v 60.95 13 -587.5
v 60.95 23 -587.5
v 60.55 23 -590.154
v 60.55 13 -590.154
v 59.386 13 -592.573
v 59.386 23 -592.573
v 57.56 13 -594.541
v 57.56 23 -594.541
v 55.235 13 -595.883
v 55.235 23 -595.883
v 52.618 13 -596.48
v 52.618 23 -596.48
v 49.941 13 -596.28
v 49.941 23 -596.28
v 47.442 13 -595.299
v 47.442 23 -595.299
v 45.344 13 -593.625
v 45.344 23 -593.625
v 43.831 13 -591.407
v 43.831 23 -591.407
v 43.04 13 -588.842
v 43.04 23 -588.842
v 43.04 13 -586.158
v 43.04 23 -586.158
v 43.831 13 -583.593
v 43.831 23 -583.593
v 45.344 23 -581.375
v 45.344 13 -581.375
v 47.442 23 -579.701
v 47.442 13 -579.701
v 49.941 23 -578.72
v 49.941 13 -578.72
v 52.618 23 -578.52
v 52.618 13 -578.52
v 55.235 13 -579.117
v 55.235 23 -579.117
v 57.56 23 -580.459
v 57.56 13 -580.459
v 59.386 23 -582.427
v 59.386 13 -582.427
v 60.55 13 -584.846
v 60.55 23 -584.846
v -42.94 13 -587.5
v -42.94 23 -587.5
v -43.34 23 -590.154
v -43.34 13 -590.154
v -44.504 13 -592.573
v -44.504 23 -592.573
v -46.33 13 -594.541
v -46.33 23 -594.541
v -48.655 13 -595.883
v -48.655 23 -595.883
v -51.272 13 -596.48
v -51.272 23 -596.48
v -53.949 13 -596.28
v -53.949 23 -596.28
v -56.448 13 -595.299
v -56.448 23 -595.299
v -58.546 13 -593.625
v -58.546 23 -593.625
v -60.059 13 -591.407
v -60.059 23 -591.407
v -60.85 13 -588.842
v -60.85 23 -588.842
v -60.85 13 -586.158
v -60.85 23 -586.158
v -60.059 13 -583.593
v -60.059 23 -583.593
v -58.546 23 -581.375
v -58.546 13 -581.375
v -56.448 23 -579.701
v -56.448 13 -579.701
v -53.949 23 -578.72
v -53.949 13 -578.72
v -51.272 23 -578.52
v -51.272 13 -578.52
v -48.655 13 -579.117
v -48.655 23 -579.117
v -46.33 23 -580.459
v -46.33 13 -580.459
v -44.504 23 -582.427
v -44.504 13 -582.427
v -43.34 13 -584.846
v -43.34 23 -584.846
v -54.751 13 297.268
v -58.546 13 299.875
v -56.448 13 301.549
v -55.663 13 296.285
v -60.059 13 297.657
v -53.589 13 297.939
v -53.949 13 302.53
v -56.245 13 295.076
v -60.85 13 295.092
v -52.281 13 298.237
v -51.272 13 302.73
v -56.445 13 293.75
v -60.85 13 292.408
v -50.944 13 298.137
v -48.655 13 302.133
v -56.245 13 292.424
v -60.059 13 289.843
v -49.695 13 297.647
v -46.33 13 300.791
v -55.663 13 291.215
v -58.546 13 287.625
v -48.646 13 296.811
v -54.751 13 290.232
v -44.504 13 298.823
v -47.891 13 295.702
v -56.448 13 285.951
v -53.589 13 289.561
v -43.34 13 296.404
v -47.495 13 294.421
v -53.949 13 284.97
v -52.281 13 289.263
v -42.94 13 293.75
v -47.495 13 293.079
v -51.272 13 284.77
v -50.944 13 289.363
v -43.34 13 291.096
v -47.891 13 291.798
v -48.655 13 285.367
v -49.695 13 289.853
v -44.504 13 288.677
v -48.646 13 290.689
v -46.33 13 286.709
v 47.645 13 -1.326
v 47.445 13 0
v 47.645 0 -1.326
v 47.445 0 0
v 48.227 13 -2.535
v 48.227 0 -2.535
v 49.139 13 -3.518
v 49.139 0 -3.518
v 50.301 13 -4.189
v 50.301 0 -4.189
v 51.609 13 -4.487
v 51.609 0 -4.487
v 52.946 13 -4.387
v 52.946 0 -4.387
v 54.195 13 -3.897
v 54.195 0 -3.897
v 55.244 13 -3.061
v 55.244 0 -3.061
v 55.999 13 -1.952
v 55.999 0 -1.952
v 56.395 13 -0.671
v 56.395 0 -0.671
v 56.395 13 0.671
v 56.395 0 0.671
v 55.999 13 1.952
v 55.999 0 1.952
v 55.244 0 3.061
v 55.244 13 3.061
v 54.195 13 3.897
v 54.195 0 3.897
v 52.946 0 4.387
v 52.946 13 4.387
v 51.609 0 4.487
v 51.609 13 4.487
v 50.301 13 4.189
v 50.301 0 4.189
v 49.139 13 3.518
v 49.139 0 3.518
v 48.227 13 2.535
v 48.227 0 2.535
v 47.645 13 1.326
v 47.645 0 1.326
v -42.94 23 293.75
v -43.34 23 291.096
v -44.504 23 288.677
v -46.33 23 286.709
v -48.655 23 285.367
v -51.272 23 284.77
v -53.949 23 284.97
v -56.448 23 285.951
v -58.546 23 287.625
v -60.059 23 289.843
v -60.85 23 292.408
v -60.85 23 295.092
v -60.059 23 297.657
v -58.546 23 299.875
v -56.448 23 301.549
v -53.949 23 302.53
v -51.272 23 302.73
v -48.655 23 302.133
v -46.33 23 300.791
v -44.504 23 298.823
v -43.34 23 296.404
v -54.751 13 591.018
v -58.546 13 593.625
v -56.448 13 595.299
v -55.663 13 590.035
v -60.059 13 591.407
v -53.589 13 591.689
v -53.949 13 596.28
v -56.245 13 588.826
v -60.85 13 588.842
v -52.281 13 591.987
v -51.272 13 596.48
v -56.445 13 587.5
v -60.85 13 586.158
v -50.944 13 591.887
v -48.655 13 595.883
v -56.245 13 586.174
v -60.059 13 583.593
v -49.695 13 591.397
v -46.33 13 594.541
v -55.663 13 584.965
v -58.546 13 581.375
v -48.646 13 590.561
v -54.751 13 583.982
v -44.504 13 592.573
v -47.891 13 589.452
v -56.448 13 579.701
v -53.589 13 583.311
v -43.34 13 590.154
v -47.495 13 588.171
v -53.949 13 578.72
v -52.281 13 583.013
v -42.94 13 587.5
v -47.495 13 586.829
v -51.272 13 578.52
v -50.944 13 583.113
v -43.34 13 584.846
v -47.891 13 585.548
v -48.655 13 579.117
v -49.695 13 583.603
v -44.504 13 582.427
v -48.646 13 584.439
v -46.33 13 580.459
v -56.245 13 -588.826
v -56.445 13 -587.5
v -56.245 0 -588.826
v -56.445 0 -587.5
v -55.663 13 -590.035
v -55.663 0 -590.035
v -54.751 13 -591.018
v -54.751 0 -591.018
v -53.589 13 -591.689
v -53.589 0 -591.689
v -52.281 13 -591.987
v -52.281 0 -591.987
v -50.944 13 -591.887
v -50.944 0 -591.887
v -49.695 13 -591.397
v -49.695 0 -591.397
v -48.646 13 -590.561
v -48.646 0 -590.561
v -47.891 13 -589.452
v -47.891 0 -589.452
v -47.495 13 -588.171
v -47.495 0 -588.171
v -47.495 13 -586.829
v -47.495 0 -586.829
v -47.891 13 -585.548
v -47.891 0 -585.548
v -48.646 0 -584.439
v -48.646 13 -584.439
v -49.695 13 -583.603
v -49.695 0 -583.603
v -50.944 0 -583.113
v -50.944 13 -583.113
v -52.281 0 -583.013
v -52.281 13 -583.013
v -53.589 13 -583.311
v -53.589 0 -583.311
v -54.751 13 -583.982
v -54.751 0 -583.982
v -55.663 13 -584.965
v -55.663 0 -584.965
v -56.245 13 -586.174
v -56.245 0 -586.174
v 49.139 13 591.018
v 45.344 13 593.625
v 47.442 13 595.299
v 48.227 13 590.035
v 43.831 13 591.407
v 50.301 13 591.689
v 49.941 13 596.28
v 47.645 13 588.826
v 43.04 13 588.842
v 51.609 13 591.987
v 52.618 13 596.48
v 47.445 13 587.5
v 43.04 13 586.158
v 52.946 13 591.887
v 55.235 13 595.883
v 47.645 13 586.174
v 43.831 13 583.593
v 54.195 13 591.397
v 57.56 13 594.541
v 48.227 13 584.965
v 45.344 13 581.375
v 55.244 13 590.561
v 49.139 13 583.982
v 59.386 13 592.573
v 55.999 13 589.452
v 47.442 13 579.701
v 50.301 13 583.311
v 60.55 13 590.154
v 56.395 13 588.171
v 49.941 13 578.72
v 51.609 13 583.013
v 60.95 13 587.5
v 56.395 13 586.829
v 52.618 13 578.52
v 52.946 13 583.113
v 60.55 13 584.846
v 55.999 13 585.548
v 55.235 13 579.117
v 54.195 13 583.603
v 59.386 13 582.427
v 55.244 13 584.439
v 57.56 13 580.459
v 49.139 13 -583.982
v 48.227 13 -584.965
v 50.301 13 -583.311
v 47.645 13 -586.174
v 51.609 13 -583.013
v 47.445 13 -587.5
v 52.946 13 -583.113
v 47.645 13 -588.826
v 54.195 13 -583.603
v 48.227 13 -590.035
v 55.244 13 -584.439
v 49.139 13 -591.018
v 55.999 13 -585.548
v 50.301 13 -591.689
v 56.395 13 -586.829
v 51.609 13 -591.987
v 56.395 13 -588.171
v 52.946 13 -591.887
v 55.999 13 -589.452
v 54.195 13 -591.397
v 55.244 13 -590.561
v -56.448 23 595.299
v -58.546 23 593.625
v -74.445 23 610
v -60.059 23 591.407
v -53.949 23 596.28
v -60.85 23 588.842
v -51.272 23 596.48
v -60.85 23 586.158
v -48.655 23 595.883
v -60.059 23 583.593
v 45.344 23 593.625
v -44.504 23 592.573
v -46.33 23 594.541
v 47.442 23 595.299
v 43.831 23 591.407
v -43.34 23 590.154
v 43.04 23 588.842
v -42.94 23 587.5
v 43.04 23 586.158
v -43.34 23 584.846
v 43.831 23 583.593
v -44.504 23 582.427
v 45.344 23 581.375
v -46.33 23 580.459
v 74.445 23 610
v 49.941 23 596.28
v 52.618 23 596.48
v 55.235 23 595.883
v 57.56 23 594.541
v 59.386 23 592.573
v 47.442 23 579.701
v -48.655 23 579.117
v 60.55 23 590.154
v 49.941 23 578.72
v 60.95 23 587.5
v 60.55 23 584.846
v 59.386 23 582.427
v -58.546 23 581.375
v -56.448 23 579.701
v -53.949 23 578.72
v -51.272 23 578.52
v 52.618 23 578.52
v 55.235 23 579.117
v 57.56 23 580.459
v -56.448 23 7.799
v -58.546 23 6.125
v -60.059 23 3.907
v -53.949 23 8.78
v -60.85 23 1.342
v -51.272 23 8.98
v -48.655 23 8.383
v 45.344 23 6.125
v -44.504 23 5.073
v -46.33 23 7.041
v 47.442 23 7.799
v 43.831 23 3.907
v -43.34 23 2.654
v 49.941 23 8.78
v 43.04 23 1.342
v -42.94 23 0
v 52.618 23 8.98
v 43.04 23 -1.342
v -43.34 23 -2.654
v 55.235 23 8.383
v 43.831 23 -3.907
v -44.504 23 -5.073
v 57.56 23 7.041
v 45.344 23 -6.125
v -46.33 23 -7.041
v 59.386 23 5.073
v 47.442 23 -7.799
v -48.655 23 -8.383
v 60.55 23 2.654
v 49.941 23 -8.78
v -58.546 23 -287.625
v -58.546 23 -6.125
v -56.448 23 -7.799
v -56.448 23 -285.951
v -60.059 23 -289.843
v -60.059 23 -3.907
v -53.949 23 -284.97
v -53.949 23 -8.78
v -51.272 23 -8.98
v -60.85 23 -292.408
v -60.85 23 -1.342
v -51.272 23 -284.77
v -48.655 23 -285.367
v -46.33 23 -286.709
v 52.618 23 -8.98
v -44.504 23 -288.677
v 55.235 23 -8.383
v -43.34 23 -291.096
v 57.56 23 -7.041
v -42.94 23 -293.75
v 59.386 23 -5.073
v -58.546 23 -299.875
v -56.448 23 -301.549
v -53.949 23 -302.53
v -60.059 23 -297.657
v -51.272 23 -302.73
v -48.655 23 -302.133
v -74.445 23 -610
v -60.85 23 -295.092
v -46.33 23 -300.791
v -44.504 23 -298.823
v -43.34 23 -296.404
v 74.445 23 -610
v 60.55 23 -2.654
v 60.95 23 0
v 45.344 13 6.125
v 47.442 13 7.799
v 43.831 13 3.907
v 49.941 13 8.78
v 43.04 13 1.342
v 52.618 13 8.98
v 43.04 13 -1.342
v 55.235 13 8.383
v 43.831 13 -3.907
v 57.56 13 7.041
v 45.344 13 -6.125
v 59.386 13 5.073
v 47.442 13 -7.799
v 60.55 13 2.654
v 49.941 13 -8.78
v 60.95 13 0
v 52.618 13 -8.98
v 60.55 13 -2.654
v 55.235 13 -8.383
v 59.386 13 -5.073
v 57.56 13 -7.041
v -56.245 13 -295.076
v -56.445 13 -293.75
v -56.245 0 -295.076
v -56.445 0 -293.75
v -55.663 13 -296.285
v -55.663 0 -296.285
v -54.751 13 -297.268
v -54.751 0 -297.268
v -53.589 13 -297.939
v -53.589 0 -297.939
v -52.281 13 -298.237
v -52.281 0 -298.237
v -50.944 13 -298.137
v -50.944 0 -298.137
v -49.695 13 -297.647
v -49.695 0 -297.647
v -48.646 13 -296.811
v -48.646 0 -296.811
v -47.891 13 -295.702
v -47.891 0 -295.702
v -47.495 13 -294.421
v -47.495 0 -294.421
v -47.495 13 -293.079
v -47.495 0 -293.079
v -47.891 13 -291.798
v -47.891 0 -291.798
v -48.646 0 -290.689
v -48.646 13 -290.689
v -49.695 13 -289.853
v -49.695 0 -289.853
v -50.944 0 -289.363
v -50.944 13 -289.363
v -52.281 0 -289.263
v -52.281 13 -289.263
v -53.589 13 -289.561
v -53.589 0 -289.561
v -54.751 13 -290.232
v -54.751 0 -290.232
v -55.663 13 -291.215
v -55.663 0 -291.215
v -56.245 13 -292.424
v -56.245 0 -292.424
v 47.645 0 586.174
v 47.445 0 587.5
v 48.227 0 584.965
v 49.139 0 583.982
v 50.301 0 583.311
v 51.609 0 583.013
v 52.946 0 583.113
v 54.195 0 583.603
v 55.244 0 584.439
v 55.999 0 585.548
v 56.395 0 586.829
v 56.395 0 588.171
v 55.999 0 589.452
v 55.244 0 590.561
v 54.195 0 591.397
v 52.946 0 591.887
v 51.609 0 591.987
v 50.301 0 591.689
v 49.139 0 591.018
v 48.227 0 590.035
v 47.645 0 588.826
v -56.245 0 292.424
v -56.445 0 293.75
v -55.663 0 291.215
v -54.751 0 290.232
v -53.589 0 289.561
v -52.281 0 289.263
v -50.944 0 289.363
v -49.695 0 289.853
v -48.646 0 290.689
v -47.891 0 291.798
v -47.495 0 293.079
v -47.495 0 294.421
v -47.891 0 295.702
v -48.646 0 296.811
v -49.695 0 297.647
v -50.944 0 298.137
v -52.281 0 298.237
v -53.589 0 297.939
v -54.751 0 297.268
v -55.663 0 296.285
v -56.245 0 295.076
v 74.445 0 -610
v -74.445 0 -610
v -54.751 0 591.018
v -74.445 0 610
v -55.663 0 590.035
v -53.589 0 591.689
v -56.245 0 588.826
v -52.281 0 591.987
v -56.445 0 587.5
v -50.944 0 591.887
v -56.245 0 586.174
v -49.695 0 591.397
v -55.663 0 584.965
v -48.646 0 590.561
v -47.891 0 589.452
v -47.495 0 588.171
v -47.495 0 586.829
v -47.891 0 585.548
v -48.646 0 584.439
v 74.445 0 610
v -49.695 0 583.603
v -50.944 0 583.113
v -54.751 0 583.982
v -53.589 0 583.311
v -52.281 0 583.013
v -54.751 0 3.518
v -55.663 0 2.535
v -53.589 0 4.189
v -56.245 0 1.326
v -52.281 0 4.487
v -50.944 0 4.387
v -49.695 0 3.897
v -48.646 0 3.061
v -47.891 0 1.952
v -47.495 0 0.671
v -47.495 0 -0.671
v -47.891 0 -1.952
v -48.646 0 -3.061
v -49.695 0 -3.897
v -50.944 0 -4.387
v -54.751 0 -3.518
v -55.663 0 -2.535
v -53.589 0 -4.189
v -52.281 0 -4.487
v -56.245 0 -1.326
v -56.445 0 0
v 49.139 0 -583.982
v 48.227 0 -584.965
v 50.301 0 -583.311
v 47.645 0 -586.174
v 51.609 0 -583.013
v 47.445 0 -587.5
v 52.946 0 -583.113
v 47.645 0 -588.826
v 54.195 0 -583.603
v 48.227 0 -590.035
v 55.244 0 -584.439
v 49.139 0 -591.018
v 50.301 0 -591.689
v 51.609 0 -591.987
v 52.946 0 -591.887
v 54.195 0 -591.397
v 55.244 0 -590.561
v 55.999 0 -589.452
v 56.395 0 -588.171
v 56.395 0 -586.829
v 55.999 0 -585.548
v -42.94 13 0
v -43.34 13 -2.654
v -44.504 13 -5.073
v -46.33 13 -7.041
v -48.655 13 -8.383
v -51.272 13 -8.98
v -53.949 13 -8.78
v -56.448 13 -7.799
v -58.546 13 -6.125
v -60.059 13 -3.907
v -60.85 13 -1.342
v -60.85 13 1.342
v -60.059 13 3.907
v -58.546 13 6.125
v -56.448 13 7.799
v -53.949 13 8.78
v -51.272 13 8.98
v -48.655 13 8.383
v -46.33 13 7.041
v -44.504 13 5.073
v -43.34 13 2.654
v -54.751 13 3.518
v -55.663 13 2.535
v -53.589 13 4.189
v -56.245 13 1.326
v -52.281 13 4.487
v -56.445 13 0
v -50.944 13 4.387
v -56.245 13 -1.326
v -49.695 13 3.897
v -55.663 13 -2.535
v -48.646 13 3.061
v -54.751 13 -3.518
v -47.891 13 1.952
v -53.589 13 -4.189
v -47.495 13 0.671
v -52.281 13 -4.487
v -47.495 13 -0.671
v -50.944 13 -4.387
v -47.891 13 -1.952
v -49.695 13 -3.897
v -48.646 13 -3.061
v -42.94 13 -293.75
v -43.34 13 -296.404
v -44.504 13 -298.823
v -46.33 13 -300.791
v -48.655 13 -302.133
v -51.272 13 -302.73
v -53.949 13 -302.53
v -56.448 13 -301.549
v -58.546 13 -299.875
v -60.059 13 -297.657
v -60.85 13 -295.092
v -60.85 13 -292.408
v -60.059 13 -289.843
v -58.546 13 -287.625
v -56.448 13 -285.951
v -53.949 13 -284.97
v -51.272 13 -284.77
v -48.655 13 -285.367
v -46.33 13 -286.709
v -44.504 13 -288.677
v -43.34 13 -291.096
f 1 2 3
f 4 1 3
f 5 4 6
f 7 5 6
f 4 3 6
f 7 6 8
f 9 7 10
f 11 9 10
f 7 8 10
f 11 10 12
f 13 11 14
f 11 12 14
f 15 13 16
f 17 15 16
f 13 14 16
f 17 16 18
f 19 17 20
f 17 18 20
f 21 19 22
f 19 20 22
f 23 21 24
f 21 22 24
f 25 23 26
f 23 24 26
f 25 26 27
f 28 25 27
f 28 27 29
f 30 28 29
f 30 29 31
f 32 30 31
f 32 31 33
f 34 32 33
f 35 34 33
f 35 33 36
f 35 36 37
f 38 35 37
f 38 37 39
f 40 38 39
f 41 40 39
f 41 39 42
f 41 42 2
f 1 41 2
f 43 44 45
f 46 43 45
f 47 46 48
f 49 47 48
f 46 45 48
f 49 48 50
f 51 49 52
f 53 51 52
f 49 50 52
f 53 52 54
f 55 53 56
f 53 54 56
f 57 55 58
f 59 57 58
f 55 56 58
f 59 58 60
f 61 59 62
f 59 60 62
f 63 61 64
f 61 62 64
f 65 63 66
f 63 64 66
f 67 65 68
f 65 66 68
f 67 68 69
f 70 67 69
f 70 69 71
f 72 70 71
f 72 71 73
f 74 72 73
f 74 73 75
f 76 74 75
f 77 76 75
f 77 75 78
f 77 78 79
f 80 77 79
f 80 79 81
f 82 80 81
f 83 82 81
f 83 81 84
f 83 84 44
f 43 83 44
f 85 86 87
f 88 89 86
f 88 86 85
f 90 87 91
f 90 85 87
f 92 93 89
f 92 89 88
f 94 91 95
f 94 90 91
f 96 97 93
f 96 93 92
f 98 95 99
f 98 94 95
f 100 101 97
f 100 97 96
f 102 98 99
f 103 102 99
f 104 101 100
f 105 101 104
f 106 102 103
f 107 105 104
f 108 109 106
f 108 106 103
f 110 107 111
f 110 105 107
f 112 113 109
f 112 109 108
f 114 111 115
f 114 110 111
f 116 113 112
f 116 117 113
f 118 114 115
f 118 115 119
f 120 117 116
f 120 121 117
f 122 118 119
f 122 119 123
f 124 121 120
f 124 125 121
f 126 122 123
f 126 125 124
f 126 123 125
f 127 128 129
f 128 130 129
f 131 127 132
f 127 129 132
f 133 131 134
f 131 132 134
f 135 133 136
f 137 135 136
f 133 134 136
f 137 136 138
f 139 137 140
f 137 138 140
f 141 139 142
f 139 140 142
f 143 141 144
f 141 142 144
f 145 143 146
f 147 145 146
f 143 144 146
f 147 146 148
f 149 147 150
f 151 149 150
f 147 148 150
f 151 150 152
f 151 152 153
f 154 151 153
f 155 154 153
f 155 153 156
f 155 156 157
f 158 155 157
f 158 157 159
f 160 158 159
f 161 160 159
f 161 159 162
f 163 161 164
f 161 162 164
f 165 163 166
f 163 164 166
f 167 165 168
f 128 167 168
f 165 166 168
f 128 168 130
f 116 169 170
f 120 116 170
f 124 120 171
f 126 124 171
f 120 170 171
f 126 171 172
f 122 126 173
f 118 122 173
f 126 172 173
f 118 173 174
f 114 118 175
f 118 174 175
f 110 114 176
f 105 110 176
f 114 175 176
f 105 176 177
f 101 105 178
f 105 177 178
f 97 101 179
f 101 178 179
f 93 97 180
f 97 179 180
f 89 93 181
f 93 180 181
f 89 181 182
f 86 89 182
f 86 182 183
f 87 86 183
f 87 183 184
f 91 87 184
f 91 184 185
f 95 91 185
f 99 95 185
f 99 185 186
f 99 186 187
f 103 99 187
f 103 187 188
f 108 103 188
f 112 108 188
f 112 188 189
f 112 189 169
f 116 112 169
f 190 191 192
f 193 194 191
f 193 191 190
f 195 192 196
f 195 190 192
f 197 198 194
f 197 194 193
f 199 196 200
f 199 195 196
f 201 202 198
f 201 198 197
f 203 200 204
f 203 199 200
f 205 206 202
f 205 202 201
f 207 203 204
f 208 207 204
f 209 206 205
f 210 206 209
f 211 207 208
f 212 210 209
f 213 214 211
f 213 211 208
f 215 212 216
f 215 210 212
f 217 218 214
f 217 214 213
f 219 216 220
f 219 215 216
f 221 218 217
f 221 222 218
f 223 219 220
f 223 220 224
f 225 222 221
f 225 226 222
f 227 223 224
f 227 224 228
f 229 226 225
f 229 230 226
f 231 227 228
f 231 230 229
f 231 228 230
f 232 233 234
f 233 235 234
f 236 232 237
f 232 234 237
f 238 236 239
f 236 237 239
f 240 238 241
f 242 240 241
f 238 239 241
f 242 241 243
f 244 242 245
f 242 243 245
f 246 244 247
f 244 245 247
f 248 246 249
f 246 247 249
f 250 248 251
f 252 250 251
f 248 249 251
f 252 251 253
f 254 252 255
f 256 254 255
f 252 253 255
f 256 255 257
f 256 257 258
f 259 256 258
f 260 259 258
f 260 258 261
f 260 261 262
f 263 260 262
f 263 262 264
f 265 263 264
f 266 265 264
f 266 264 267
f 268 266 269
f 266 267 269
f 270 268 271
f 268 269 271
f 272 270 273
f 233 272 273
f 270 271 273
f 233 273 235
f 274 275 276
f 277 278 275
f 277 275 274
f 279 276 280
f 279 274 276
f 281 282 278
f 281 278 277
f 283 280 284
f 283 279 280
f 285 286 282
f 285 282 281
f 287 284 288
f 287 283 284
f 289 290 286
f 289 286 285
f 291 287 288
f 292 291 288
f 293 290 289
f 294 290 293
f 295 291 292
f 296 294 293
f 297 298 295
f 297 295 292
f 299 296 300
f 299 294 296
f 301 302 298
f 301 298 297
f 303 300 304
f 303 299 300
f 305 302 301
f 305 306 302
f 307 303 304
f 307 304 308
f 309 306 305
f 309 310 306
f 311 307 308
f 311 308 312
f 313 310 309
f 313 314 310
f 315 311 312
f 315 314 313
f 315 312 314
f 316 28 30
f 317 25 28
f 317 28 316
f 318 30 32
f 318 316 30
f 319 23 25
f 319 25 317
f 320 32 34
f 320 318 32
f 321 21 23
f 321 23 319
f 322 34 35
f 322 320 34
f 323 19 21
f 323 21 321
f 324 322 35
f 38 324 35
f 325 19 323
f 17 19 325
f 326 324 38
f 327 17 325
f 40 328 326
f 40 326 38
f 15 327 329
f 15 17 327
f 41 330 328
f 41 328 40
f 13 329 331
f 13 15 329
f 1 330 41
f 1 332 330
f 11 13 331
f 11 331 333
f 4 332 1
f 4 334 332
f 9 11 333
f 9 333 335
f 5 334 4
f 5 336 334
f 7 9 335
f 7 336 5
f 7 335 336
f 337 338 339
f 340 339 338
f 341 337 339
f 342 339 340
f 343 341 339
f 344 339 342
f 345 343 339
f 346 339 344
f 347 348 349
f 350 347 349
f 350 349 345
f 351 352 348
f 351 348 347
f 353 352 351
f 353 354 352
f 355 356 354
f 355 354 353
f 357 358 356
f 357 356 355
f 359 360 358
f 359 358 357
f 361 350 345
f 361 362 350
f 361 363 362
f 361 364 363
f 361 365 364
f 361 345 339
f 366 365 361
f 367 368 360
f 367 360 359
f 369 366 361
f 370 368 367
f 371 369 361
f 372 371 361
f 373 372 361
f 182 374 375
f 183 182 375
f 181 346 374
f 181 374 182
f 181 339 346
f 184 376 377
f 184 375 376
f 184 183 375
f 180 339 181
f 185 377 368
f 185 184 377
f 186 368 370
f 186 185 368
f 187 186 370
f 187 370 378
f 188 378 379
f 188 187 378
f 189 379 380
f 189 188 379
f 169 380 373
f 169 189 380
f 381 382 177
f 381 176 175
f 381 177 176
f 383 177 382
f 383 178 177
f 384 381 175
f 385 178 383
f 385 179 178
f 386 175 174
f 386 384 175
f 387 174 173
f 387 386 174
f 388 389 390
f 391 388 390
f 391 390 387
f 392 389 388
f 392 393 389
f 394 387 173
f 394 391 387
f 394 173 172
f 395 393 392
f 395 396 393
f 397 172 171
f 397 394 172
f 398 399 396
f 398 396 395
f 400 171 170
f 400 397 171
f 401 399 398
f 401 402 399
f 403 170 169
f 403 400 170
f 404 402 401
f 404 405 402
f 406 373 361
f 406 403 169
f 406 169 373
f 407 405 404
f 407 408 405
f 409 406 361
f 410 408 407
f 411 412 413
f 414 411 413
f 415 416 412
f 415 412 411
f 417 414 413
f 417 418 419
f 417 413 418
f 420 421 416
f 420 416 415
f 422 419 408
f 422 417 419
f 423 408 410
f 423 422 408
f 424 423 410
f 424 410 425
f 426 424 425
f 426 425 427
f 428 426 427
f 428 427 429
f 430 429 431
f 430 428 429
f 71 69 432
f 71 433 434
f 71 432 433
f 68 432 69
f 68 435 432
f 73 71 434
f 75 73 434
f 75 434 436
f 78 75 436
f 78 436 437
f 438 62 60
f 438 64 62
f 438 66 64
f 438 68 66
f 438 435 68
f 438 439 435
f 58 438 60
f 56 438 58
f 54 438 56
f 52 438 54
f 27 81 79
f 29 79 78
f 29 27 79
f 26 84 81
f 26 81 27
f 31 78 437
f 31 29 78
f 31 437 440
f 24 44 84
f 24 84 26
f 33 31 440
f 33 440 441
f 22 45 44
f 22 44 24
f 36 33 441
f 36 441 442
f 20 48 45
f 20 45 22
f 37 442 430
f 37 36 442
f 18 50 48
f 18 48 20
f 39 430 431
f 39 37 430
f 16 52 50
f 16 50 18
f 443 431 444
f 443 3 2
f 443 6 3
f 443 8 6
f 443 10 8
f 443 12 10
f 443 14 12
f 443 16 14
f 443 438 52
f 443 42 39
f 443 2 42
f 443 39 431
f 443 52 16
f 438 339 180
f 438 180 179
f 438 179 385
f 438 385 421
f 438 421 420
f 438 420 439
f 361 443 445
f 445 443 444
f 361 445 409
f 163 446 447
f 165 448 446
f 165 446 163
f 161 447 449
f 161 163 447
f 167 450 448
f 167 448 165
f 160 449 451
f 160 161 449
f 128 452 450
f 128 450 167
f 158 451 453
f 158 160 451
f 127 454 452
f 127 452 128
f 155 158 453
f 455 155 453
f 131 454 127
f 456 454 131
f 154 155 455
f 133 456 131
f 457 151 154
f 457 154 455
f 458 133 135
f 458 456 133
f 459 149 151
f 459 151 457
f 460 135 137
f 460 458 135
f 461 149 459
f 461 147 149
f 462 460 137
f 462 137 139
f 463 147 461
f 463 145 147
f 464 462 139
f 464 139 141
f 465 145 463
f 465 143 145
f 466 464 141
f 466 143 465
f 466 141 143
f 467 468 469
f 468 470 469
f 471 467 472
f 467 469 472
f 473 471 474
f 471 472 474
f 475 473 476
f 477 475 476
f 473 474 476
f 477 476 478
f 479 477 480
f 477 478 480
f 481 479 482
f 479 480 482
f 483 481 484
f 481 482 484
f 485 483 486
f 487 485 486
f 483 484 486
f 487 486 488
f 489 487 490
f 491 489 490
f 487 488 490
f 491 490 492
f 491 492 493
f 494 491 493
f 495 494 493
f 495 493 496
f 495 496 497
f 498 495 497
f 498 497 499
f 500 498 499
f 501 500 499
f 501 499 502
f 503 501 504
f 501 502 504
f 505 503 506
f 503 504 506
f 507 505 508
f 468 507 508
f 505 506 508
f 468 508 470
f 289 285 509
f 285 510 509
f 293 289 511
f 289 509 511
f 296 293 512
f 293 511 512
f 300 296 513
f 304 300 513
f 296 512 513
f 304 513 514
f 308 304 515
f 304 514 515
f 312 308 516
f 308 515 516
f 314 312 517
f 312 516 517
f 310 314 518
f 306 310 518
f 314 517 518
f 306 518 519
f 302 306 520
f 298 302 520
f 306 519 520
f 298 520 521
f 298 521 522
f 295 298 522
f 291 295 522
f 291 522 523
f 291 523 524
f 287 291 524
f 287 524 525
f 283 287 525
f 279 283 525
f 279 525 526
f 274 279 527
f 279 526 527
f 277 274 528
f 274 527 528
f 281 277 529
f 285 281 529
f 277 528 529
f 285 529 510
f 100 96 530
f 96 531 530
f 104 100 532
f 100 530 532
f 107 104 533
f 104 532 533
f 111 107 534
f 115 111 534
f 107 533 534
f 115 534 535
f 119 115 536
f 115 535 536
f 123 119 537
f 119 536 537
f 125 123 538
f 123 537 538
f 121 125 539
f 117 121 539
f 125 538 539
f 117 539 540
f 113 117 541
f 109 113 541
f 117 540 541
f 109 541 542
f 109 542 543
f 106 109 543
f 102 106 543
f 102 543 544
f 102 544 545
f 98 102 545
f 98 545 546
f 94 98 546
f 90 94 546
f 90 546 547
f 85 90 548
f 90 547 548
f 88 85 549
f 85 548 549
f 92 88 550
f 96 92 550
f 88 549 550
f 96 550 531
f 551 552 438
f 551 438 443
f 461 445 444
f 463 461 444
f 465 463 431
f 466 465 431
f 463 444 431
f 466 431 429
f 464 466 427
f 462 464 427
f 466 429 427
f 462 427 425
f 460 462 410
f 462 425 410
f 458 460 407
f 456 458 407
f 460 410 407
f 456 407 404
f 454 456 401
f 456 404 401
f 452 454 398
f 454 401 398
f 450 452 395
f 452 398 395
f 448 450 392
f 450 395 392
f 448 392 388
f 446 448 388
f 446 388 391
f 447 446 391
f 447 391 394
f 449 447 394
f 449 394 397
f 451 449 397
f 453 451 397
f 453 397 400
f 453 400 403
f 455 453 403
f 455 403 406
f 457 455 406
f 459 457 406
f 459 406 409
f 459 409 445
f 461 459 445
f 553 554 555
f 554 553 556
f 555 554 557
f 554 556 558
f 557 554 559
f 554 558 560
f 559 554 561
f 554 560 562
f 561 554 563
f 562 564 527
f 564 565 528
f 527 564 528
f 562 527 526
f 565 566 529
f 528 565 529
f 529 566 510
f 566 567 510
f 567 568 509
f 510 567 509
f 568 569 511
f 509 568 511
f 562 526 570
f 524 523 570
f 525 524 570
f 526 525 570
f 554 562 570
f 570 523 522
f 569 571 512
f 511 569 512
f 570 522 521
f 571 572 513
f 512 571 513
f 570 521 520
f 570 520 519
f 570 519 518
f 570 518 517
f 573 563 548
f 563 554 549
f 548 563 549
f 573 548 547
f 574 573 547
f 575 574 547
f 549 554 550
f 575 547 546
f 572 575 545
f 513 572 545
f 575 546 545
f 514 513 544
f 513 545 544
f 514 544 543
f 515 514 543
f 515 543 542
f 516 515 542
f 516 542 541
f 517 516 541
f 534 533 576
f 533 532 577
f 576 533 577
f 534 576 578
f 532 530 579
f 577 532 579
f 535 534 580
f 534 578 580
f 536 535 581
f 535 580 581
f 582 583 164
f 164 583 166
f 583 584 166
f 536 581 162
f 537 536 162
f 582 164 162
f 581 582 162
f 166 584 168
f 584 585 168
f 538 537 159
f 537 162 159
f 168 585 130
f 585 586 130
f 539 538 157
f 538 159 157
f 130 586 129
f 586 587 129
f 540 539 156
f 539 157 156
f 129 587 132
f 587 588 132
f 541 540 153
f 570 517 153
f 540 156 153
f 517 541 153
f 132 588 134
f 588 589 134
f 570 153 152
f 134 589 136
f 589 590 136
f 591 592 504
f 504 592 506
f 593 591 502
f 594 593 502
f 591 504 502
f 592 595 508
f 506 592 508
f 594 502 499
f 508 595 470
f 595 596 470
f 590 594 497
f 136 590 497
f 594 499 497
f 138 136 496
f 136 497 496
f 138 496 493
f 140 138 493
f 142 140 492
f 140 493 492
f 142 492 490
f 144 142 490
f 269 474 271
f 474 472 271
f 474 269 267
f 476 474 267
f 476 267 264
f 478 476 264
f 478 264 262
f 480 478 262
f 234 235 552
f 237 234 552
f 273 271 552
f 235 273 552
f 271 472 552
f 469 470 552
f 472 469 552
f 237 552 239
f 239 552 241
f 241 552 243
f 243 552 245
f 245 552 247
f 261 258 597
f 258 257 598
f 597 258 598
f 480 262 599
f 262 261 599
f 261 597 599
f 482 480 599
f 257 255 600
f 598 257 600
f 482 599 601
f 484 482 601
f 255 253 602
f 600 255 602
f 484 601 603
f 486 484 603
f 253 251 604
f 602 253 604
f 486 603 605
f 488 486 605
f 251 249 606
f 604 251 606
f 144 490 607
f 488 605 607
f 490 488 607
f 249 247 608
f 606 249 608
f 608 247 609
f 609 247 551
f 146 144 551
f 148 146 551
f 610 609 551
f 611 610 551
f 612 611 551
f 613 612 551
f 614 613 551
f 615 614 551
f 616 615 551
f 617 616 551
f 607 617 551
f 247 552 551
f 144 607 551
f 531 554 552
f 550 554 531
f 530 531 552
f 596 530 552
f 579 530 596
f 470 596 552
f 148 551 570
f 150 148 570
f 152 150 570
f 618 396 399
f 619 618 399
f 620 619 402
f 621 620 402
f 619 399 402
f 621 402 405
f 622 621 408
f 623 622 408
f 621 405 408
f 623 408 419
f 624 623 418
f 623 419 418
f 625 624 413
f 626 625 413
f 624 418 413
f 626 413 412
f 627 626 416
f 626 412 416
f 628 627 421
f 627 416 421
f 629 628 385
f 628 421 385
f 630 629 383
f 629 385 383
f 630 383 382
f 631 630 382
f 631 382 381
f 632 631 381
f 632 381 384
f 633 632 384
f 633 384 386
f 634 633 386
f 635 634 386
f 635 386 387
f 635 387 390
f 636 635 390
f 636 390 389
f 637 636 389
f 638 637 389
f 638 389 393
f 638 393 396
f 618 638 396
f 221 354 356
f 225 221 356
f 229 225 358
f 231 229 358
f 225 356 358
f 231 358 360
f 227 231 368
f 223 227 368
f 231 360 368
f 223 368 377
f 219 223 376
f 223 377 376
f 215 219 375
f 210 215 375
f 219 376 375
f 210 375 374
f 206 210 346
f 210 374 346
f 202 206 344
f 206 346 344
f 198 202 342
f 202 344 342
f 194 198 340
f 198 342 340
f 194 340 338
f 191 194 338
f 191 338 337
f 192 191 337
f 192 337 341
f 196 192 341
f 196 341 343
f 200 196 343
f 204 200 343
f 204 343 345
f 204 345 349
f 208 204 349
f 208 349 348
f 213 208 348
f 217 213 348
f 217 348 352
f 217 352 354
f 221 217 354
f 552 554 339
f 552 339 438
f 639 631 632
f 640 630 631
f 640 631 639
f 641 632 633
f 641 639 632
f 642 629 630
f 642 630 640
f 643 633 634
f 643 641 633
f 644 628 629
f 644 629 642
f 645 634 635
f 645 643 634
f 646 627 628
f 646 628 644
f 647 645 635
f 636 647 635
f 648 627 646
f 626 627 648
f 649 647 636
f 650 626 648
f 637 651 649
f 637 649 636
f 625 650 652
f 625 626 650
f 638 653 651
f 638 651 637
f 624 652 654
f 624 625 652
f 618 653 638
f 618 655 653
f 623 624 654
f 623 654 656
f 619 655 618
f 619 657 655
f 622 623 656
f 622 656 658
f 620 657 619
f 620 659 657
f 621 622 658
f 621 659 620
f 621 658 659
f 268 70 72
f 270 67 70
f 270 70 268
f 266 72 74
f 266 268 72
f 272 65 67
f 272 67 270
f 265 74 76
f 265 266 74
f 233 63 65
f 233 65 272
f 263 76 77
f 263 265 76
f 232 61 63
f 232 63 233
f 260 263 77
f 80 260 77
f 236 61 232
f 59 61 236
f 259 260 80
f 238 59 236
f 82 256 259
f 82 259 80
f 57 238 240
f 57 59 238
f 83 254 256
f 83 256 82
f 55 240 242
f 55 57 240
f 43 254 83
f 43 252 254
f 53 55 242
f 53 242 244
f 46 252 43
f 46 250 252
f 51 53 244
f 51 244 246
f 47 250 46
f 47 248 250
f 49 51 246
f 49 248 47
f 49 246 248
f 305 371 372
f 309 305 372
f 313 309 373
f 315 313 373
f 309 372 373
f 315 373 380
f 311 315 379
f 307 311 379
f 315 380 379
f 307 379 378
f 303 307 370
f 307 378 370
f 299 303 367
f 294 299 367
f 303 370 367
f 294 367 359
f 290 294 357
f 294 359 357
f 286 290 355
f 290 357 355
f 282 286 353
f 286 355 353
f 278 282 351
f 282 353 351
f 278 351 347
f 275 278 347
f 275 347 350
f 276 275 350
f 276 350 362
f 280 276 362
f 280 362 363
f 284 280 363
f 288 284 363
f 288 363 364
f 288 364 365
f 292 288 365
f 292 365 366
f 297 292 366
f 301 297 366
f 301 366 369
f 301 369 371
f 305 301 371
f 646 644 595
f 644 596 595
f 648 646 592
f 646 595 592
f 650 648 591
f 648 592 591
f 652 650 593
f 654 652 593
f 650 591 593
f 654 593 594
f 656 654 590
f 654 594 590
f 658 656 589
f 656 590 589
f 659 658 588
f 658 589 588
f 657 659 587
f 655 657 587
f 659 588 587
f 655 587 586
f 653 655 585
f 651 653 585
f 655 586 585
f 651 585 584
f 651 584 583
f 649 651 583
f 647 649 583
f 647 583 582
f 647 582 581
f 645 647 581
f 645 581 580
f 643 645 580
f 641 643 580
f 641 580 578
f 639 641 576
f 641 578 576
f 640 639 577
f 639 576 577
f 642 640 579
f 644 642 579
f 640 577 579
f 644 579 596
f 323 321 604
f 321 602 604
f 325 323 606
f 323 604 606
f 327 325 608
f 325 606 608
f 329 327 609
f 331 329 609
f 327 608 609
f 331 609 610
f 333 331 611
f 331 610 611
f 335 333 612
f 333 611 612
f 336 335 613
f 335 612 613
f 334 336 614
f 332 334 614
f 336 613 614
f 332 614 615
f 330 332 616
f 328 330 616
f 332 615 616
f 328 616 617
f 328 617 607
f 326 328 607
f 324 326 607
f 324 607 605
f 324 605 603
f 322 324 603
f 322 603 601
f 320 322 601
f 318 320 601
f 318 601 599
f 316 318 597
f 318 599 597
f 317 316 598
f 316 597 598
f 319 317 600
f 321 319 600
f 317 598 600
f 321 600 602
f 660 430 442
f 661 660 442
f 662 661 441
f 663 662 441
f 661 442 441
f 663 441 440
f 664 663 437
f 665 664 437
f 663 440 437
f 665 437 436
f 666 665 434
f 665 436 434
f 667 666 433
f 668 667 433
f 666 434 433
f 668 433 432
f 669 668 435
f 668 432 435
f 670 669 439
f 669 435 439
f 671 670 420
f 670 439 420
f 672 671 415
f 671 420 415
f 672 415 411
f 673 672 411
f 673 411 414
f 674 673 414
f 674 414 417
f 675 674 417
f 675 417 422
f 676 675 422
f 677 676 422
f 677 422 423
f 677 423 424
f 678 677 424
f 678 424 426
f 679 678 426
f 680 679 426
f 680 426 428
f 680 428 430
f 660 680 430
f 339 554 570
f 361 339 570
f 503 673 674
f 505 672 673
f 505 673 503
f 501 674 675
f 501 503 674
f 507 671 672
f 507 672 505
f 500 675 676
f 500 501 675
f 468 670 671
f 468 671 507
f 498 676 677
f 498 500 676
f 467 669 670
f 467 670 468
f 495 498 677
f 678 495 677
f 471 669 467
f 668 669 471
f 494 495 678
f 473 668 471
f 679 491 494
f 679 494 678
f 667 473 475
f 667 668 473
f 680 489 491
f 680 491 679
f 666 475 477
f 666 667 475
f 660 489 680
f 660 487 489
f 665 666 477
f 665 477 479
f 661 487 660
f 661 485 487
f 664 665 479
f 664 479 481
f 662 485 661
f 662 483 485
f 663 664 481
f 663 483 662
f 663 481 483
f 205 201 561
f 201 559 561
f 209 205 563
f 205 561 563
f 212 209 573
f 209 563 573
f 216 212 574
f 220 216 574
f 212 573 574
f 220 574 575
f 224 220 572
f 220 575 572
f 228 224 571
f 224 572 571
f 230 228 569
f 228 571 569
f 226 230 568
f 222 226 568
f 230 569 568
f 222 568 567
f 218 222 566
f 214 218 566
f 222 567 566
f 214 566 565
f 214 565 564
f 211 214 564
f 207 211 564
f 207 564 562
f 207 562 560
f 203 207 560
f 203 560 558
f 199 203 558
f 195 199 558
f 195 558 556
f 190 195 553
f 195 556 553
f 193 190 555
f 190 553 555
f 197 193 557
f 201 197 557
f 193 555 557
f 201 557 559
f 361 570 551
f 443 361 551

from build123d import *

# Parameters (mm, degrees)
SKETCH1_W                               = 148.89
SKETCH1_H                               = 1220
BOSS_EXTRUDE1_DEPTH                     = 23
CBORE_FOR_M8_HEX_HEAD_BOLT1_D           = 9
CBORE_FOR_M8_HEX_HEAD_BOLT1_CBORE_D     = 18.011
CBORE_FOR_M8_HEX_HEAD_BOLT1_CBORE_DEPTH = 10


with BuildPart() as part:
    # Sketch1 → Boss-Extrude1 (new body)
    with BuildSketch(Plane(origin=(0, 0, 0), x_dir=(1, 0, 0), z_dir=(0, 1, 0))):
        Rectangle(SKETCH1_W, SKETCH1_H)
    extrude(amount=BOSS_EXTRUDE1_DEPTH)

    # CBORE for M8 Hex Head Bolt1 (through all)
    with Locations(Plane(origin=(0, 23, 0), x_dir=(1, 0, 0), z_dir=(0, 1, 0))):
        with Locations((-51.945, 587.5), (51.945, 587.5), (-51.945, 0), (51.945, 0), (-51.945, -587.5), (51.945, -587.5), (-51.945, -293.75), (-51.945, 293.75)):
            CounterBoreHole(CBORE_FOR_M8_HEX_HEAD_BOLT1_D / 2, CBORE_FOR_M8_HEX_HEAD_BOLT1_CBORE_D / 2, CBORE_FOR_M8_HEX_HEAD_BOLT1_CBORE_DEPTH)


solid = part.part
